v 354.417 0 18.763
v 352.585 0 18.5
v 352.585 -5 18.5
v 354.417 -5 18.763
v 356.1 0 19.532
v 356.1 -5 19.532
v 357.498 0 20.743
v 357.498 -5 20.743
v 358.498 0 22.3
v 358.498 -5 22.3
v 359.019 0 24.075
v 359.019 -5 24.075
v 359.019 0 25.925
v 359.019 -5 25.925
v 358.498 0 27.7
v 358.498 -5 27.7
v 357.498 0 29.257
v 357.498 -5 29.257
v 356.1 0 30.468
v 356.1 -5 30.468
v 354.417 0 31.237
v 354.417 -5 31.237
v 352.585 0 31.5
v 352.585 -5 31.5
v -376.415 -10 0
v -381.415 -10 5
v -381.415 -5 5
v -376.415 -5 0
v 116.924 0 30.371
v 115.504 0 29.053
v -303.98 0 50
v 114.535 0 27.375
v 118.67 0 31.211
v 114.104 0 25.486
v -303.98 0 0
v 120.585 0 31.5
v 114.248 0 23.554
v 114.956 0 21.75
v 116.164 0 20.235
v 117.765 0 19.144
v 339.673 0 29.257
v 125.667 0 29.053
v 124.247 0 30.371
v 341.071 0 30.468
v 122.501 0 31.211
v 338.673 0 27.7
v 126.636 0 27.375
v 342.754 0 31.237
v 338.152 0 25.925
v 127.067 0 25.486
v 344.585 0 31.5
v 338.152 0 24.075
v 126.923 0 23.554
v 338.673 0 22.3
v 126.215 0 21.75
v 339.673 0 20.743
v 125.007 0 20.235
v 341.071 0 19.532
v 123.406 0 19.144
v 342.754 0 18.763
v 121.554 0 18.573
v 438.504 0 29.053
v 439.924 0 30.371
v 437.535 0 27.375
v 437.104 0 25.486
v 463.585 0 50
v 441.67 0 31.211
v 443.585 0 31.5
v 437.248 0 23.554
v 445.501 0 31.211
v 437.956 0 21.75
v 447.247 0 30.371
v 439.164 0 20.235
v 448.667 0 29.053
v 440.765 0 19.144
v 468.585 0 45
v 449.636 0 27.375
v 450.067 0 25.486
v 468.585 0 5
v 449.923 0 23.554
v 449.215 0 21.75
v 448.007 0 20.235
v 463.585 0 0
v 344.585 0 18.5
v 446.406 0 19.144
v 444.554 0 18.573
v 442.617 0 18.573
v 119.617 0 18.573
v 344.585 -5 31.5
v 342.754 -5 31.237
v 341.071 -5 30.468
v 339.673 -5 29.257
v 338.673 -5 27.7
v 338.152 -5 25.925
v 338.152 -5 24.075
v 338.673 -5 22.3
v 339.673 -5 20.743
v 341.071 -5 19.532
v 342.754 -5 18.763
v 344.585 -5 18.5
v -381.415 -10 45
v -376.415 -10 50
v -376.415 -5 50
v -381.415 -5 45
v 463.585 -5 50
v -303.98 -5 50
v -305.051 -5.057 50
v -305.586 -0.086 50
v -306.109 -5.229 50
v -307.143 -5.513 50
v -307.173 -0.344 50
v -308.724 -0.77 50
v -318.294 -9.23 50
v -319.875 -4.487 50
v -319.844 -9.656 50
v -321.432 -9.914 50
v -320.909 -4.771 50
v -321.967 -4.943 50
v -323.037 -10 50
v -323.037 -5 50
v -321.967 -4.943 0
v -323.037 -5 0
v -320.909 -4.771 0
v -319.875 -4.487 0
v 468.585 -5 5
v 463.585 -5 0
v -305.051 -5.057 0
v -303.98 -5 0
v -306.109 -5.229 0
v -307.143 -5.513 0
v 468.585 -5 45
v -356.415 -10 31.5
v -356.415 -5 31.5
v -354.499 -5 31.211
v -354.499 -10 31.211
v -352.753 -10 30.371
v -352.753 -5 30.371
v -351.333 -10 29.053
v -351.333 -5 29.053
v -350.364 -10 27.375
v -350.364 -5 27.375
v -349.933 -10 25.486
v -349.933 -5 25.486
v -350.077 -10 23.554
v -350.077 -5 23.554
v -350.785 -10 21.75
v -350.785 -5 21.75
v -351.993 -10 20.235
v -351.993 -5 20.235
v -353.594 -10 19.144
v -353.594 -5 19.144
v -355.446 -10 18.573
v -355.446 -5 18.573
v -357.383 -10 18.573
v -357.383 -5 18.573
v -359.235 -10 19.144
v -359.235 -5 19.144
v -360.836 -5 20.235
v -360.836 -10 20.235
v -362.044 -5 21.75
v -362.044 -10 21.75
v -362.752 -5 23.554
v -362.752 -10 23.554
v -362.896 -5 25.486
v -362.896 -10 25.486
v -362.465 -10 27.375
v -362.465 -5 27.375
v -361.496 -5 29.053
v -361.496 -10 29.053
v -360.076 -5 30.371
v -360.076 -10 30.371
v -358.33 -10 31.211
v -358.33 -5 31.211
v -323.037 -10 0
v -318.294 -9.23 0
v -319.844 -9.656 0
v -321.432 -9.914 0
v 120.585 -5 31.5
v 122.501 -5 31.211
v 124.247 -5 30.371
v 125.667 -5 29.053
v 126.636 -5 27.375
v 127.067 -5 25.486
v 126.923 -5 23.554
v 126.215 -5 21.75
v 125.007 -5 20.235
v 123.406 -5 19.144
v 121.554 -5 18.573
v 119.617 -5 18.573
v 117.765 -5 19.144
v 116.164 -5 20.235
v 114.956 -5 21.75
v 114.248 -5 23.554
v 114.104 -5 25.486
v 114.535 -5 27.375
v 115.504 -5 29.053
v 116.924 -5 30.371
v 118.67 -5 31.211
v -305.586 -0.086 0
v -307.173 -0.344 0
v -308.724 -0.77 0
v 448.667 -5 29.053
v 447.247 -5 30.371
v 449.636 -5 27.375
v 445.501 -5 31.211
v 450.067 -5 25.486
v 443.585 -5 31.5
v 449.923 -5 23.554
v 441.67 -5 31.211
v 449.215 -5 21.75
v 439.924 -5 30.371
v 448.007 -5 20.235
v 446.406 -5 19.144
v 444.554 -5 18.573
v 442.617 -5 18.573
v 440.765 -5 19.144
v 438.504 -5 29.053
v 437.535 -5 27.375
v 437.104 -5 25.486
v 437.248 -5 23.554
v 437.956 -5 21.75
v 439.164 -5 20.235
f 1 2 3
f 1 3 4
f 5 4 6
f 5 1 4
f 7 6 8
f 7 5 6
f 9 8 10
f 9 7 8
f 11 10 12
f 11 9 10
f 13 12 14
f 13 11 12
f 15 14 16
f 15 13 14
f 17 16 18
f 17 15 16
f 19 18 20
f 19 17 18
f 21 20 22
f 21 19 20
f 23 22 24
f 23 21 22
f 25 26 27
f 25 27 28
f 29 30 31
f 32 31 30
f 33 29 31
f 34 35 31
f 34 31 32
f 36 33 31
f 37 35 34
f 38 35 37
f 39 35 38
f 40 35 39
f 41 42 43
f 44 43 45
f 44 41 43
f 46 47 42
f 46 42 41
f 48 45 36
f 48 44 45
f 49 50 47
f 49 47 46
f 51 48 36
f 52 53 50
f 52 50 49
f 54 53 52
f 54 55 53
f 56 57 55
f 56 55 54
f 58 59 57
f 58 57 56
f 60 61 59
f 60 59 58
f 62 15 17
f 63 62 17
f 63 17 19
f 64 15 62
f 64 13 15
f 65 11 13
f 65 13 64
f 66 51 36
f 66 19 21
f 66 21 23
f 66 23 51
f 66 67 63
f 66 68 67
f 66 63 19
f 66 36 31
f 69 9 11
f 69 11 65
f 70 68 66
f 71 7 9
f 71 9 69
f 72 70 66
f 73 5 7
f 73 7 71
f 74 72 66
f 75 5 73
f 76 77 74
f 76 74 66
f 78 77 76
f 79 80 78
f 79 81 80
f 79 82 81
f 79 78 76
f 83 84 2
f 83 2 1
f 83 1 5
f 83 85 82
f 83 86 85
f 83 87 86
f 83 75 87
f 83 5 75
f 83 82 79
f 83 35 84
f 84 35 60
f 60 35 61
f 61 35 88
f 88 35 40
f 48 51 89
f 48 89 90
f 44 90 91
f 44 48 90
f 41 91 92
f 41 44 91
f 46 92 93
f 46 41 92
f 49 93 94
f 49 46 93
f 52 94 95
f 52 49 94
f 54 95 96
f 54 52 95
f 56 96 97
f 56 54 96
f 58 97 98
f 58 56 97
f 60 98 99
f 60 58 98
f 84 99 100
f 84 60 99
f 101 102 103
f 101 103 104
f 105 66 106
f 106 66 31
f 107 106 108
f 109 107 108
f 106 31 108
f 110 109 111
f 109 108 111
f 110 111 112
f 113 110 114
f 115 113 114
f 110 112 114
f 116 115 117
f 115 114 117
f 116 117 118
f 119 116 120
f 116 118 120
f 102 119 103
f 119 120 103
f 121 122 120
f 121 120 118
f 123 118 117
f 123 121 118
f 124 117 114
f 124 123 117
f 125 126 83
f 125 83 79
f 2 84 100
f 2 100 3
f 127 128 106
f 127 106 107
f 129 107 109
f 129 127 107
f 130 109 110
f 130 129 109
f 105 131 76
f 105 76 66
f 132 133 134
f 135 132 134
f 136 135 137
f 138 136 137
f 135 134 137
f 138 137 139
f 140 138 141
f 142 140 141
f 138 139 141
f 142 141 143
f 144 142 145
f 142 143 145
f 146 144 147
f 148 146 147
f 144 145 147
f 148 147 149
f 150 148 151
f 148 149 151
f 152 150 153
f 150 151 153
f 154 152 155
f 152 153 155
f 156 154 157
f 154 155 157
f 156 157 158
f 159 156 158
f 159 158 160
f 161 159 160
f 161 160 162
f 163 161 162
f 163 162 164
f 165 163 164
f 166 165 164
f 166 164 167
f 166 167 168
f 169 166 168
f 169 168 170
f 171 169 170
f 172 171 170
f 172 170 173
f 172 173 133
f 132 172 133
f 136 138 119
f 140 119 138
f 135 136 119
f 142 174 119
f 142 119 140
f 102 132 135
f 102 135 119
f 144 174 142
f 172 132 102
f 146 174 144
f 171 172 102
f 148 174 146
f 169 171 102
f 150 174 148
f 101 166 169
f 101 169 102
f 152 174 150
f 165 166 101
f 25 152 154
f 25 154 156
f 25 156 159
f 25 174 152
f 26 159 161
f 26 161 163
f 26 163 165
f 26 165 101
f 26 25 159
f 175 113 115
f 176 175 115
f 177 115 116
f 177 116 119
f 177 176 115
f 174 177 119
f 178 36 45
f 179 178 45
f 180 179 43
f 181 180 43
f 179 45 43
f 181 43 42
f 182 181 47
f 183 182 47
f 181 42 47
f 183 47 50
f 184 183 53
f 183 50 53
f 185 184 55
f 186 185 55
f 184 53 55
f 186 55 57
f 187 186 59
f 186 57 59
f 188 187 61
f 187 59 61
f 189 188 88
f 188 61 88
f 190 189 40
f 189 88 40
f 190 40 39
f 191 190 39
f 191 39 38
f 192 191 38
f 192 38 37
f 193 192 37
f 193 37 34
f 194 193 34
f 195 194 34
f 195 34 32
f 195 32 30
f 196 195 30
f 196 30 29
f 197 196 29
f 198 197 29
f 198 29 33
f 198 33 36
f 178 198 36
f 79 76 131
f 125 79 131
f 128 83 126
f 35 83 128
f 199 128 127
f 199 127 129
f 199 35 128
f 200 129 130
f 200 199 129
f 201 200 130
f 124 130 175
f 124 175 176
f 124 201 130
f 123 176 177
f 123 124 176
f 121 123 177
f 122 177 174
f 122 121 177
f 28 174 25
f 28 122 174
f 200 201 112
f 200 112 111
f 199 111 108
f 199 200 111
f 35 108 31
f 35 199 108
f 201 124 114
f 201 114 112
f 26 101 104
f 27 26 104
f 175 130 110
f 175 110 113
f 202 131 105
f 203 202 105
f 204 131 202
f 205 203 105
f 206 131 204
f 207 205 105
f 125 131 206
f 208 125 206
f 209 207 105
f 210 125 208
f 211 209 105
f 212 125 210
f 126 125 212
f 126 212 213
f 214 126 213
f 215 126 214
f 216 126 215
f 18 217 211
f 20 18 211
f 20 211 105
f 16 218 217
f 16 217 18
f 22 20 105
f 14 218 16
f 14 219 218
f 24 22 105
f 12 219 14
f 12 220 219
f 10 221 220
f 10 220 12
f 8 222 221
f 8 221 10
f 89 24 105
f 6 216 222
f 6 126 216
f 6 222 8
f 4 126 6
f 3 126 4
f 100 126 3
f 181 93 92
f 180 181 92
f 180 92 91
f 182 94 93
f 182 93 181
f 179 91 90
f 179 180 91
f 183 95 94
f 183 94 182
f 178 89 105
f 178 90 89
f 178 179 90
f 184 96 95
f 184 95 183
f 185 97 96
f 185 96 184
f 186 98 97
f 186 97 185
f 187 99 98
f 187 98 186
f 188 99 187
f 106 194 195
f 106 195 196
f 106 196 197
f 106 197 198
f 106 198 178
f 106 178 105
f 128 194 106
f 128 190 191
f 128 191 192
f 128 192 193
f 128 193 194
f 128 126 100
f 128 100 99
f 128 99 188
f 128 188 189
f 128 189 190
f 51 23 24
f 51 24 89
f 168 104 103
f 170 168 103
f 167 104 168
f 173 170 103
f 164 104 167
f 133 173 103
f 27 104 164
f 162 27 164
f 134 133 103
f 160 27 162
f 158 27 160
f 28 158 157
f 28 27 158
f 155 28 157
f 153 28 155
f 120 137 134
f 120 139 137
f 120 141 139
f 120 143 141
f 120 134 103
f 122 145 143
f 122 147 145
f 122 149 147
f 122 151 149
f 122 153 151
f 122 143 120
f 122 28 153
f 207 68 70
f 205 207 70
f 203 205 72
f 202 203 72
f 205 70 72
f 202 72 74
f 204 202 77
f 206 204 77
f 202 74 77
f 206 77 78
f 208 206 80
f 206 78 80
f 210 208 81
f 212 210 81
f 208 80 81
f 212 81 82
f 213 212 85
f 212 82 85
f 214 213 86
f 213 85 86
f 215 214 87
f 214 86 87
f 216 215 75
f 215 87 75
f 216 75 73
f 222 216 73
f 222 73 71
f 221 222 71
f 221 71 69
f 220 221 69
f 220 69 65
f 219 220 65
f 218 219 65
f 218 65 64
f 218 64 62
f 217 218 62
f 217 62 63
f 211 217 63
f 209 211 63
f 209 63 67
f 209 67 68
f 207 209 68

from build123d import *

# Parameters (mm, degrees)
SM_BASE_FLANGE_1_DEPTH = 50
SKETCH_2_R             = 6.5
CUT_EXTRUDE_1_DEPTH    = 10
CUT_EXTRUDE_2_DEPTH    = 10
SKETCH_4_R             = 6.5
CUT_EXTRUDE_3_DEPTH    = 10
SKETCH_5_R             = 6.5
CUT_EXTRUDE_4_DEPTH    = 10
OTHER_START            = -10
OTHER_1_DEPTH          = 10


# Read off the part's stored shape, not the designer's step: Затупленный угол1
# Sheet-metal steps are written as plain solids
with BuildPart() as part:
    # Sketch 1 → Базовая кромка1 (new body)
    with BuildSketch(Plane.XY):
        with BuildLine():
            Line((-381.414527052, -5), (-323.037303653, -5))
            ThreePointArc((-323.037303653, -5), (-321.435481223, -4.870874576), (-319.875025993, -4.486832981))
            Line((-319.875025993, -4.486832981), (-308.723778639, -0.769750529))
            ThreePointArc((-308.723778639, -0.769750529), (-306.383095794, -0.193688135), (-303.980362149, 0))
            Line((-303.980362149, 0), (468.585472948, 0))
            Line((468.585472948, 0), (468.585472948, -5))
            Line((468.585472948, -5), (-303.980362149, -5))
            ThreePointArc((-303.980362149, -5), (-305.582184579, -5.129125424), (-307.142639809, -5.513167019))
            Line((-307.142639809, -5.513167019), (-318.293887163, -9.230249471))
            ThreePointArc((-318.293887163, -9.230249471), (-320.634570008, -9.806311865), (-323.037303653, -10))
            Line((-323.037303653, -10), (-381.414527052, -10))
            Line((-381.414527052, -10), (-381.414527052, -5))
        make_face()
    extrude(amount=SM_BASE_FLANGE_1_DEPTH)

    # Sketch 2 → Вырез-Вытянуть1 (cut)
    with BuildSketch(Plane(origin=(0, 0, 0), x_dir=(1, 0, 0), z_dir=(0, 1, 0))):
        with Locations(Location((443.585472948, -25, 0), (0, 0, 270))):
            Circle(SKETCH_2_R)
    extrude(amount=-CUT_EXTRUDE_1_DEPTH, mode=Mode.SUBTRACT)

    # Эскиз3 → Вырез-Вытянуть2 (cut)
    with BuildSketch(Plane(origin=(0, 0, 0), x_dir=(1, 0, 0), z_dir=(0, 1, 0))):
        with BuildLine():
            Line((344.585472948, -18.5), (352.585472948, -18.5))
            ThreePointArc((352.585472948, -18.5), (359.085472948, -25), (352.585472948, -31.5))
            Line((352.585472948, -31.5), (344.585472948, -31.5))
            ThreePointArc((344.585472948, -31.5), (338.085472948, -25), (344.585472948, -18.5))
        make_face()
    extrude(amount=-CUT_EXTRUDE_2_DEPTH, mode=Mode.SUBTRACT)

    # Эскиз4 → Вырез-Вытянуть3 (cut)
    with BuildSketch(Plane(origin=(0, 0, 0), x_dir=(1, 0, 0), z_dir=(0, 1, 0))):
        with Locations(Location((120.585472948, -25, 0), (0, 0, 270))):
            Circle(SKETCH_4_R)
    extrude(amount=-CUT_EXTRUDE_3_DEPTH, mode=Mode.SUBTRACT)

    # Эскиз5 → Вырез-Вытянуть4 (cut)
    with BuildSketch(Plane(origin=(0, -5, 0), x_dir=(1, 0, 0), z_dir=(0, 1, 0))):
        with Locations(Location((-356.414527052, -25, 0), (0, 0, 270))):
            Circle(SKETCH_5_R)
    extrude(amount=-CUT_EXTRUDE_4_DEPTH, mode=Mode.SUBTRACT)

    # Other 1 outline → Other 1 (cut)
    with BuildSketch(Plane(origin=(0, 0, 0), x_dir=(1, 0, 0), z_dir=(0, 1, 0)).offset(OTHER_START)):
        Polygon((468.585472948, 0), (463.585472948, 0), (468.585472948, -5), align=None)
        Polygon((468.585472948, -50), (468.585472948, -45), (463.585472948, -50), align=None)
        Polygon((-381.414527052, 0), (-381.414527052, -5), (-376.414527052, 0), align=None)
        Polygon((-376.414527052, -50), (-381.414527052, -45), (-381.414527052, -50), align=None)
    extrude(amount=OTHER_1_DEPTH, mode=Mode.SUBTRACT)


solid = part.part
